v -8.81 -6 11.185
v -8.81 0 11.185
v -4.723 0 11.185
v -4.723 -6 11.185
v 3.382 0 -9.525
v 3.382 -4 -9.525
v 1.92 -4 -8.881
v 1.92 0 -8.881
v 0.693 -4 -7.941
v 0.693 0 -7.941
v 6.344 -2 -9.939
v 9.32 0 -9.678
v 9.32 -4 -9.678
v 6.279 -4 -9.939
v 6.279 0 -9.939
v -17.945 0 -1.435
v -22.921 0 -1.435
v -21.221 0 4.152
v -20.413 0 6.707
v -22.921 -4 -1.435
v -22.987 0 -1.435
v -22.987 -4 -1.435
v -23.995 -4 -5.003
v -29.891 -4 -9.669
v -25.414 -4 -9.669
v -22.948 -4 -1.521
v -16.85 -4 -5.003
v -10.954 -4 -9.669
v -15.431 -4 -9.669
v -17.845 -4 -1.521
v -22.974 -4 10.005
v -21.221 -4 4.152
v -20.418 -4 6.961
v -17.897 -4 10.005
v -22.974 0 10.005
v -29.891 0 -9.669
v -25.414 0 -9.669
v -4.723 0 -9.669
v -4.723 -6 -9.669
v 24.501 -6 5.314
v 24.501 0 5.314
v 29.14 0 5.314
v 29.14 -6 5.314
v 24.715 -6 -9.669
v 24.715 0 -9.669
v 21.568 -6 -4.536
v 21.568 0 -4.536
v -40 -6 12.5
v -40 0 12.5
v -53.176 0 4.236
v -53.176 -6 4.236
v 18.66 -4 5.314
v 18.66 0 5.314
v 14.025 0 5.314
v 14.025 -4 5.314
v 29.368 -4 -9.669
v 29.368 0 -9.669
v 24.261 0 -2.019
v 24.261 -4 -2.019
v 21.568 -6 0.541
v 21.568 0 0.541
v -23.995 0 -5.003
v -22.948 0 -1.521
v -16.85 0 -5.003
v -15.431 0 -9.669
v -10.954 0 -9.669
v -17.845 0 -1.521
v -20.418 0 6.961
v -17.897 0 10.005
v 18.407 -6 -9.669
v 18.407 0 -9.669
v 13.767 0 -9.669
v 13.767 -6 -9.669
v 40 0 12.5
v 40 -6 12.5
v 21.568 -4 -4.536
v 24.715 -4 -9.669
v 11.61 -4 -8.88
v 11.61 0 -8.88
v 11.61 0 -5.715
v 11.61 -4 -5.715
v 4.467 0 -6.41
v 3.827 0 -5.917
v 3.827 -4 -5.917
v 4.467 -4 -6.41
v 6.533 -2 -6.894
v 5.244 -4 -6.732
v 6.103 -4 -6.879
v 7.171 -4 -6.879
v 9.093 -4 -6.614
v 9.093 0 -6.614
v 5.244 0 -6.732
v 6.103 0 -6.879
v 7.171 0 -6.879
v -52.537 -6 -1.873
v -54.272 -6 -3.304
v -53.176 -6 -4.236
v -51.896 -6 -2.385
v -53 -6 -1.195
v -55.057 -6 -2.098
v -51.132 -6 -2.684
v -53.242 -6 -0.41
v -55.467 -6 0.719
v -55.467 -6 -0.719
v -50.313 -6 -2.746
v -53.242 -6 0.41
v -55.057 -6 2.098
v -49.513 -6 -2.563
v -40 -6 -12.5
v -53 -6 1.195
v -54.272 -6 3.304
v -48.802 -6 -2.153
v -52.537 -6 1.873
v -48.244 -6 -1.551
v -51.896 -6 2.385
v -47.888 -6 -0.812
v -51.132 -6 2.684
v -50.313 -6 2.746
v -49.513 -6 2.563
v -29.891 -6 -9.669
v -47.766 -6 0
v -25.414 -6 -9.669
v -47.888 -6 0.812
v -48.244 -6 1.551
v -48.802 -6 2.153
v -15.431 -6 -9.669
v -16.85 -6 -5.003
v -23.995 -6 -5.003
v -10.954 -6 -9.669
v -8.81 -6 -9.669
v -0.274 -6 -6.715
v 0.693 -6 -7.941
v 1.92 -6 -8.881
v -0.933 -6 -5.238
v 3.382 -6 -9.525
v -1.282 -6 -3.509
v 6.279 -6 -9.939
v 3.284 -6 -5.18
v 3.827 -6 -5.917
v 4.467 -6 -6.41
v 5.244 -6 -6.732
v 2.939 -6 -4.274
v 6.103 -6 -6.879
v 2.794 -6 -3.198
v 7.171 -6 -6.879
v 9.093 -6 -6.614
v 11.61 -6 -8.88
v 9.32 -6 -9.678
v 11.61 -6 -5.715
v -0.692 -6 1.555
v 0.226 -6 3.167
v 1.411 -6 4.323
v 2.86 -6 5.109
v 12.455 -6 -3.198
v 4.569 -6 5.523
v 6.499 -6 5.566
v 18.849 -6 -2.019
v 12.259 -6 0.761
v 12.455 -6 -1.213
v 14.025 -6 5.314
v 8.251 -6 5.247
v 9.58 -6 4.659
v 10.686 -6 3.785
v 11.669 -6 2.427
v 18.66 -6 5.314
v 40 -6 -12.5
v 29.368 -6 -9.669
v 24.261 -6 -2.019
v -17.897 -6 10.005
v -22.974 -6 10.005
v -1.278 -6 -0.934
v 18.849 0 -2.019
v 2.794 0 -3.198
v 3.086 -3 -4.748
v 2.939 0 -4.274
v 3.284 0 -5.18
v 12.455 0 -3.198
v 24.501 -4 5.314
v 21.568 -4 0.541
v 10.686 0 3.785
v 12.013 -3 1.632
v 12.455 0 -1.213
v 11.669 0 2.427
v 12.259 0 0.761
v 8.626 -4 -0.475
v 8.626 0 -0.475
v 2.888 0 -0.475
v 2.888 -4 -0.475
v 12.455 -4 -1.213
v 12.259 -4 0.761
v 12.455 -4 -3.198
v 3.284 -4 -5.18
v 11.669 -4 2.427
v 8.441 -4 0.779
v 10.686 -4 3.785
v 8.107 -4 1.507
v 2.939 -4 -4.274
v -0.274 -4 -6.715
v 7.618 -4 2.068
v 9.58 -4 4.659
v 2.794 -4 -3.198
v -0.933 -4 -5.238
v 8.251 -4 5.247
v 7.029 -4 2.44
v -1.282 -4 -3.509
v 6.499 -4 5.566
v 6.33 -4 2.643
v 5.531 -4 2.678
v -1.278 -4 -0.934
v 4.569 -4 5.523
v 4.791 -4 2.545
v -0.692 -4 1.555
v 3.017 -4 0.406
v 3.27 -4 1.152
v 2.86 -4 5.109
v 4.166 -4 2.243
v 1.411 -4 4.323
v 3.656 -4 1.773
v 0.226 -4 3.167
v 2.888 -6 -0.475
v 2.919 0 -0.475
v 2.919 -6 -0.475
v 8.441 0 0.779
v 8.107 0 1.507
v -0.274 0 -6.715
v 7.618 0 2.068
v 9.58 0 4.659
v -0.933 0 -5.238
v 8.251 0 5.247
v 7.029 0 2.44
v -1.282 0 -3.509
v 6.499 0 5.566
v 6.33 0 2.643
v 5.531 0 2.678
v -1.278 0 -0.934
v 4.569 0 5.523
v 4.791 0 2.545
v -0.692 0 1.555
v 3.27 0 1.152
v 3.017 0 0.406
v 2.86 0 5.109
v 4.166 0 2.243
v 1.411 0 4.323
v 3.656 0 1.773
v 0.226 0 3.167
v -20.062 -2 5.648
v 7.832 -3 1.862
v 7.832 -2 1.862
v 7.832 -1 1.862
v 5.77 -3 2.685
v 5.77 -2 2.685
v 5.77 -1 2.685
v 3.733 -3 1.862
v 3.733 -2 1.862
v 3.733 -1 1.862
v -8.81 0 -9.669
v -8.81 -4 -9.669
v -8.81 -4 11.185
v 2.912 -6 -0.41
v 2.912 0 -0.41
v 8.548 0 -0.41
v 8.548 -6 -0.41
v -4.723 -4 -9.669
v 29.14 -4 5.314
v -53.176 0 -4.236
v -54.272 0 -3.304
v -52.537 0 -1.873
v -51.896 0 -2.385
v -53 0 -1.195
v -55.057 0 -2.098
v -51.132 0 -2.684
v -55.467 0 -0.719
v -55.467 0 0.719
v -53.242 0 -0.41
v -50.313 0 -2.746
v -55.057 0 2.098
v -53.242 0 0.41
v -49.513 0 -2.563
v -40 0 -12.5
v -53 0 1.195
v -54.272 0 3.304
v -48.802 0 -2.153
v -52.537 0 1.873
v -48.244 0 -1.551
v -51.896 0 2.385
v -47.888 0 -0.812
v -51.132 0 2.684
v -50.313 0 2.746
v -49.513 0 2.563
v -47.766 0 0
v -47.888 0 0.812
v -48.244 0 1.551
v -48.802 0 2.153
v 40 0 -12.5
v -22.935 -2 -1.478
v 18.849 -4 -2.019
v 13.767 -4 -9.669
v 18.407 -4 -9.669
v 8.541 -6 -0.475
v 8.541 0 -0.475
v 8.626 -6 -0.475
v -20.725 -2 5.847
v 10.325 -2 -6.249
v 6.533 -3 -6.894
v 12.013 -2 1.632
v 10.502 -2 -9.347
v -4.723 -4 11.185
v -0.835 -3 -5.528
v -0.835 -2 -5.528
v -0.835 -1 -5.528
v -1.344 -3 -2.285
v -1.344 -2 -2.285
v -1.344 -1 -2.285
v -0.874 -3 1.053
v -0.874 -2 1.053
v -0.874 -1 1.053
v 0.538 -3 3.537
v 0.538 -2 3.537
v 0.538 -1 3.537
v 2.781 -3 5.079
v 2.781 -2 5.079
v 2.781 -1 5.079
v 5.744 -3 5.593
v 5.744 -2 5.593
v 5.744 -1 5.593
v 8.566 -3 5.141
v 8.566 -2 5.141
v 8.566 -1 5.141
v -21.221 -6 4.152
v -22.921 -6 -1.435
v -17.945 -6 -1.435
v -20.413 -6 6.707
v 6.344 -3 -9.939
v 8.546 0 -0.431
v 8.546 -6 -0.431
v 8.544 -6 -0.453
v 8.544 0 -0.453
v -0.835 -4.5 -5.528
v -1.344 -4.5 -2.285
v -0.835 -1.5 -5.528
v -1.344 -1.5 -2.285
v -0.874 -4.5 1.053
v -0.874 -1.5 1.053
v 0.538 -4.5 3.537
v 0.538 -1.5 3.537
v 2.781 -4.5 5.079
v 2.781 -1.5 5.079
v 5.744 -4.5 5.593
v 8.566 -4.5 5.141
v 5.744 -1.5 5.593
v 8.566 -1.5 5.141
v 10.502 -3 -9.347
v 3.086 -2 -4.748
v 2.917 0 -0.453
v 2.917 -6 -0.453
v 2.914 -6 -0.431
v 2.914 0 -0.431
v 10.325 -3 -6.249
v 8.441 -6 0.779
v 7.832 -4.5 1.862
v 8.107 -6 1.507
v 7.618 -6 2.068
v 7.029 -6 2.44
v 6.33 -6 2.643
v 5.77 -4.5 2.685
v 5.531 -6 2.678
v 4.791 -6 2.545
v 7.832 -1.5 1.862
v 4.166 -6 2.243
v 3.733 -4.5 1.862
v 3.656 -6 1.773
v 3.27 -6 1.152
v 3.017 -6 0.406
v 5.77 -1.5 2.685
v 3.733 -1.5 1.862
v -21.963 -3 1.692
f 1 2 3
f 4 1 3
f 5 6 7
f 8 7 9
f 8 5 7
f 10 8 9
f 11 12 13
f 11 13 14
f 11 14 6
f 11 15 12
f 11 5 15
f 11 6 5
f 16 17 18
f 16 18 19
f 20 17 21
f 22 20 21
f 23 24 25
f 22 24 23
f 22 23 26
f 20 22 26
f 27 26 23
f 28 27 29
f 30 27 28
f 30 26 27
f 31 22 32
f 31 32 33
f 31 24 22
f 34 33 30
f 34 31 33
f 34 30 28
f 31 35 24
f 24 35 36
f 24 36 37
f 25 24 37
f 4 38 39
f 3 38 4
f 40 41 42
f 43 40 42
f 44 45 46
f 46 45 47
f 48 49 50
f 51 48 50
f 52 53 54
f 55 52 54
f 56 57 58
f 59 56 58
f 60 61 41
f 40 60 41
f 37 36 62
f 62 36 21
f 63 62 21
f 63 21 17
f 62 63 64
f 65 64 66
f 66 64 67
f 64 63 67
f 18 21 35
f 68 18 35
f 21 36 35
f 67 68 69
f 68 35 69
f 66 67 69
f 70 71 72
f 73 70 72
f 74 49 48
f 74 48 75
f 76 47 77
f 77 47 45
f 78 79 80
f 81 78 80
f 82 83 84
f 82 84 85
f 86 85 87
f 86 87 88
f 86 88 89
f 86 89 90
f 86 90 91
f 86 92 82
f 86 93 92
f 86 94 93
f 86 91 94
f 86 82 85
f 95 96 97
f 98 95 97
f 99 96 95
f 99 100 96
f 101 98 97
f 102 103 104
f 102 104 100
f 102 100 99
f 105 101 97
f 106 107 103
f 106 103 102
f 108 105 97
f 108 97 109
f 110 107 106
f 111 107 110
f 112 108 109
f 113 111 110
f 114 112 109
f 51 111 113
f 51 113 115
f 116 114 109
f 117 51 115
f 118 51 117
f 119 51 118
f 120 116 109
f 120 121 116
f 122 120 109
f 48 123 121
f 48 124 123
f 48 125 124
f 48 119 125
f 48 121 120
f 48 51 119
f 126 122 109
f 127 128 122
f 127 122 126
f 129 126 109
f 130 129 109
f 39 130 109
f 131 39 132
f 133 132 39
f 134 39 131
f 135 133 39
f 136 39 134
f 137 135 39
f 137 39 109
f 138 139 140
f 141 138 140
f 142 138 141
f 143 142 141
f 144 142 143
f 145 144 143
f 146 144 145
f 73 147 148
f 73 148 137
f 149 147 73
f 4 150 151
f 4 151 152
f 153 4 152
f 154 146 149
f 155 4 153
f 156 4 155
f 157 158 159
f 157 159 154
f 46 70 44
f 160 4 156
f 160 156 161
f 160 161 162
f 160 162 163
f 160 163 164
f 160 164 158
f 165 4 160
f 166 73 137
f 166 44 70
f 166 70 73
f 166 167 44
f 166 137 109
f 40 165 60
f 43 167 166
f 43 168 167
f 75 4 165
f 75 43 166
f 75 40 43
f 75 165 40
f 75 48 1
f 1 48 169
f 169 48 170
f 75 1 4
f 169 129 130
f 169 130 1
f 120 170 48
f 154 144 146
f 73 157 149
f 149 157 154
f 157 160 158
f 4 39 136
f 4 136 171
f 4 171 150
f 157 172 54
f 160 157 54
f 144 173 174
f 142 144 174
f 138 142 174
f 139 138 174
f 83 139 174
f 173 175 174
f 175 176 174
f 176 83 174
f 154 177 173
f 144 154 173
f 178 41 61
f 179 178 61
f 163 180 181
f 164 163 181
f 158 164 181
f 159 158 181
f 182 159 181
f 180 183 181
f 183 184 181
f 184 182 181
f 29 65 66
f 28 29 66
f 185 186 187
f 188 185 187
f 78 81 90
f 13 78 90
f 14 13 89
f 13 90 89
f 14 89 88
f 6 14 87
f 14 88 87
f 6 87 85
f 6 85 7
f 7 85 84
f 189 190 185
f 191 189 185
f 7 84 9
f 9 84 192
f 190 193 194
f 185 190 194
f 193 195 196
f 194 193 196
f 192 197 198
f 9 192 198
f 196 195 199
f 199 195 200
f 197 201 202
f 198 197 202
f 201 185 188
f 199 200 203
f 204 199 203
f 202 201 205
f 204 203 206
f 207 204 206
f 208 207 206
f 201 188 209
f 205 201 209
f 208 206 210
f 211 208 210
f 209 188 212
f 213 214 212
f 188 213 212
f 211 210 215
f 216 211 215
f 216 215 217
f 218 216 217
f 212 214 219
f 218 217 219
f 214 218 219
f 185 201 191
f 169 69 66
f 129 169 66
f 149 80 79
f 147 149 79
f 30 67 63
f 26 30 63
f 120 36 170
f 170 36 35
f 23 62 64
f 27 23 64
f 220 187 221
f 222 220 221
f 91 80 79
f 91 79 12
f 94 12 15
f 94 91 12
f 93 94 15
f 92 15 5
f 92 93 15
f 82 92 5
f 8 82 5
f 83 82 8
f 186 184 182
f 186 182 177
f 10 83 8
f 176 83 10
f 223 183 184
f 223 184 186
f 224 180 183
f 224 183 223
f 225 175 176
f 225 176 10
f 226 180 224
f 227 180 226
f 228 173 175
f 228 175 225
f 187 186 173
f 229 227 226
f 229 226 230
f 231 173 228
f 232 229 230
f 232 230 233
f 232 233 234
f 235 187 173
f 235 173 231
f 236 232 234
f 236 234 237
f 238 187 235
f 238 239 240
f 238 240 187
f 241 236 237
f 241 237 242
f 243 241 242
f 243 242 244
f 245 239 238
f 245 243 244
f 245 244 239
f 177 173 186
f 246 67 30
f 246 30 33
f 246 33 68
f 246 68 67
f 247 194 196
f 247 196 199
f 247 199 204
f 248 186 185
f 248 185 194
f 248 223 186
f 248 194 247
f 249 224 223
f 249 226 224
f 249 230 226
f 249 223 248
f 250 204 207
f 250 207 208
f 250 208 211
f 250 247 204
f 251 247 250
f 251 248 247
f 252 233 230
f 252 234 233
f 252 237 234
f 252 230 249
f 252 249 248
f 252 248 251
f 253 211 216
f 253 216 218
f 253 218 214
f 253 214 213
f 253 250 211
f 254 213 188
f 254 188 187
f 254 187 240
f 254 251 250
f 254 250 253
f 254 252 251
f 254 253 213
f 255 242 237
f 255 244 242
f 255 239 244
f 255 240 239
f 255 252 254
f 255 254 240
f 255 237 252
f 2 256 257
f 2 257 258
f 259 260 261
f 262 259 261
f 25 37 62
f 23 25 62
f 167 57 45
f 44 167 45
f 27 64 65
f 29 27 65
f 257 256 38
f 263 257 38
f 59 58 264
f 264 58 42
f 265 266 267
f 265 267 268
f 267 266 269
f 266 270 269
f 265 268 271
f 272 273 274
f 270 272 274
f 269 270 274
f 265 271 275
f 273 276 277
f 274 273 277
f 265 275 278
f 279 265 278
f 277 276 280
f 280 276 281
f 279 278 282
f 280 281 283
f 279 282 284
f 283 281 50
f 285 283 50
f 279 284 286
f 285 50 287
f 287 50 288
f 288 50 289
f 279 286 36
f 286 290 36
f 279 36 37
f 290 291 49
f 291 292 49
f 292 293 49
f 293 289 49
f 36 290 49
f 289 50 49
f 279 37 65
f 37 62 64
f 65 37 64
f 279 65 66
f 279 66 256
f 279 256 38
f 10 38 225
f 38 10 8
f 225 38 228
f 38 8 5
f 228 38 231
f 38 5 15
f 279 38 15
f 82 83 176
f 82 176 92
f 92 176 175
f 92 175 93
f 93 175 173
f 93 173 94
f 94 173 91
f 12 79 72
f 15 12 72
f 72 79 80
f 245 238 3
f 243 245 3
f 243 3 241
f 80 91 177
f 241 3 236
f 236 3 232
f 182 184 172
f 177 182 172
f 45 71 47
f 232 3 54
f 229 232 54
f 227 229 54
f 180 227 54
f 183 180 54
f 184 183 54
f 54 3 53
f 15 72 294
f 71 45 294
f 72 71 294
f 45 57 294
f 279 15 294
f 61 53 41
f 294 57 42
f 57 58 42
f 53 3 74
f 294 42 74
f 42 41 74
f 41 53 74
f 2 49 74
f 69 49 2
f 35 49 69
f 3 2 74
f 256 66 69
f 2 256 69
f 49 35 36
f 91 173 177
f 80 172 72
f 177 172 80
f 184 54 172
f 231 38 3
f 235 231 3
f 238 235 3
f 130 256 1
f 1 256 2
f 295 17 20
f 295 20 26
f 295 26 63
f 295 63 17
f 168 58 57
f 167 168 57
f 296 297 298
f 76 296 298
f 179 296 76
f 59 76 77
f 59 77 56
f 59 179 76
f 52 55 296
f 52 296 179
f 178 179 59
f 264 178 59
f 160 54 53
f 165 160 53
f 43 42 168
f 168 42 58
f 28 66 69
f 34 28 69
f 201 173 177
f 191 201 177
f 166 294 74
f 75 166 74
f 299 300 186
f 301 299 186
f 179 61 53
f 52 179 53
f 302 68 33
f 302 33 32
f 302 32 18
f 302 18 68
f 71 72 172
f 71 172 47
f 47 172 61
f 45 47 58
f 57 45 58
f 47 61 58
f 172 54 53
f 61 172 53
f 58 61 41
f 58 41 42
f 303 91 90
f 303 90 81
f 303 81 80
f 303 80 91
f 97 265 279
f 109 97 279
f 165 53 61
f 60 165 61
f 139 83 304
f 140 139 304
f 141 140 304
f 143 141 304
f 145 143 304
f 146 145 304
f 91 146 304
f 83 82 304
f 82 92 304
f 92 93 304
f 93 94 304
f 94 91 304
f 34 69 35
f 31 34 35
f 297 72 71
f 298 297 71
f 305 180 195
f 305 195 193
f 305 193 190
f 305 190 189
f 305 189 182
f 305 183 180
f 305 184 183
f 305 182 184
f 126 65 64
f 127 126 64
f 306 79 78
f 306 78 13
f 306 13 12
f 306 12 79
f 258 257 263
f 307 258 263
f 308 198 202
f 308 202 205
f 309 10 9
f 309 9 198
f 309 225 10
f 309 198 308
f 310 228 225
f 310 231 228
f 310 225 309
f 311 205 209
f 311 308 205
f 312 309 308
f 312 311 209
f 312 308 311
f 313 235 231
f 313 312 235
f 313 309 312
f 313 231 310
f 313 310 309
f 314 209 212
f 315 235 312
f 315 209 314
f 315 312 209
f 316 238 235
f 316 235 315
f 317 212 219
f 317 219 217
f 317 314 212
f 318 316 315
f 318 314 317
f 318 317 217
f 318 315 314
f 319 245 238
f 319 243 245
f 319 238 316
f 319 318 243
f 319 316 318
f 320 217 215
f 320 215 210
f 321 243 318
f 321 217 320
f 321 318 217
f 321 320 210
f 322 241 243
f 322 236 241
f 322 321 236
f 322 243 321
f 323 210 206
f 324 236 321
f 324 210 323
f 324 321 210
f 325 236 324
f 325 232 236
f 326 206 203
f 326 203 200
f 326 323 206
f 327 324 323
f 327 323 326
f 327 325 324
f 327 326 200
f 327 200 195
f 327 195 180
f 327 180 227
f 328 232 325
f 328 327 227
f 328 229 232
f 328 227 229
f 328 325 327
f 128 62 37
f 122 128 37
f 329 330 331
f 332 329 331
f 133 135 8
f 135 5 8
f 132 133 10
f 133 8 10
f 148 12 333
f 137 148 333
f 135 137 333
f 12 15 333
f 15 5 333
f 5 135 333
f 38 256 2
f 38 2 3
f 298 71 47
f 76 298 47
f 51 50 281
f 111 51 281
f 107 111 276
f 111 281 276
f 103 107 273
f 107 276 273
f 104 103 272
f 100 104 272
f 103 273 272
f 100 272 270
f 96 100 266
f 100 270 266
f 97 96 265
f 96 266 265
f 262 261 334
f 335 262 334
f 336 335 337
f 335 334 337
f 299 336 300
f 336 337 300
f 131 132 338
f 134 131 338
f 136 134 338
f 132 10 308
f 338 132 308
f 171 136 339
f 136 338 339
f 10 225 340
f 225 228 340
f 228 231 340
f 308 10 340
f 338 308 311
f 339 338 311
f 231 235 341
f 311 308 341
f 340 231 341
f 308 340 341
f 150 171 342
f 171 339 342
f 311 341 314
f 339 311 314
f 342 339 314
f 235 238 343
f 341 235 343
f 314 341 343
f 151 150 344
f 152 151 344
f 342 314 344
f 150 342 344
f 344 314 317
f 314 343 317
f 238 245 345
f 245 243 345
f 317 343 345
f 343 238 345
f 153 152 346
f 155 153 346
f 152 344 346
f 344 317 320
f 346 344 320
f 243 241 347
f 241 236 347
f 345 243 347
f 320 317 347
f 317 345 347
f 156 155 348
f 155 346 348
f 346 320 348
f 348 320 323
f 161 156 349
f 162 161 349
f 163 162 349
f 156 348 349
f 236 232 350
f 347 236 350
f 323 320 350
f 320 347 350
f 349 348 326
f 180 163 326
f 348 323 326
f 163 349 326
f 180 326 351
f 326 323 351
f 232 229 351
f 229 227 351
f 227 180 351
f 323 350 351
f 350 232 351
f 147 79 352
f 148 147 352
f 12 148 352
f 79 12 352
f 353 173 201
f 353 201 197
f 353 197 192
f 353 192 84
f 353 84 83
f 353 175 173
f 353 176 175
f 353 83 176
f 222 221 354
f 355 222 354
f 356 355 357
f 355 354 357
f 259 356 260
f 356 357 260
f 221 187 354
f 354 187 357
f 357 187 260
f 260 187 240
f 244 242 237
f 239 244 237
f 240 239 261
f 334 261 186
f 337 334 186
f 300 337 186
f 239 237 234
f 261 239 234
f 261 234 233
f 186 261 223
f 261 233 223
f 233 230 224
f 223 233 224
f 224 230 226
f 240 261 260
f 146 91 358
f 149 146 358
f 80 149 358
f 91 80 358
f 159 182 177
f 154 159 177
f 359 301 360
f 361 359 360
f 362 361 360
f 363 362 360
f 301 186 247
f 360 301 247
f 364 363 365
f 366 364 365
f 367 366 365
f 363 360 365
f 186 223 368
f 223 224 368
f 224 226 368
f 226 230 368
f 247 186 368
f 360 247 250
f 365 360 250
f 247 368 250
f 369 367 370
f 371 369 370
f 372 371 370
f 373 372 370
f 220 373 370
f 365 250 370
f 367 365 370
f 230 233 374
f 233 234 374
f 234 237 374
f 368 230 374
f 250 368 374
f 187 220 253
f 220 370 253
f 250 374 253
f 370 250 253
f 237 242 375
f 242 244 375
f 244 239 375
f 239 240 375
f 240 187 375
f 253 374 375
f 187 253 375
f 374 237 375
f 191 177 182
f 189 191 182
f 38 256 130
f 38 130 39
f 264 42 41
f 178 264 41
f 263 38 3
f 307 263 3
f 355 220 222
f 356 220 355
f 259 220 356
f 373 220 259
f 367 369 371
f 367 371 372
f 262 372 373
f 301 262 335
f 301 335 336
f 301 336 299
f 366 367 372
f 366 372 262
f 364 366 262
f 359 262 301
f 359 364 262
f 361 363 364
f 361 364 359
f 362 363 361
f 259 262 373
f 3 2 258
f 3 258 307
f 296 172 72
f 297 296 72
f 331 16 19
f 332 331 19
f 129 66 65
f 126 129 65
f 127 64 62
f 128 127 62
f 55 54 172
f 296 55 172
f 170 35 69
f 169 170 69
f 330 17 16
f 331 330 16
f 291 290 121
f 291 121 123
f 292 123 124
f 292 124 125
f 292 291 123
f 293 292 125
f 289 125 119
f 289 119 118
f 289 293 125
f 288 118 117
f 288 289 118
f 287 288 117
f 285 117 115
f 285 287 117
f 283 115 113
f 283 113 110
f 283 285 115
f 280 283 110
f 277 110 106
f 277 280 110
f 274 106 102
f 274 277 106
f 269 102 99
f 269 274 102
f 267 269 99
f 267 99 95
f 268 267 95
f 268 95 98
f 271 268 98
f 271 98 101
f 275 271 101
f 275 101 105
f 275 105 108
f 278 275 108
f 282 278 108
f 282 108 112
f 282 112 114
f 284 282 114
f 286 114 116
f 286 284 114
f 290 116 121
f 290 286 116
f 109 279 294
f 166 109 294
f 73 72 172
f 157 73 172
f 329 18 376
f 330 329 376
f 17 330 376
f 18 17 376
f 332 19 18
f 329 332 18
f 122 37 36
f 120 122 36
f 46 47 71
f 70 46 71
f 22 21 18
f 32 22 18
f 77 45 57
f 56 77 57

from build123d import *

# Parameters (mm, degrees)
F0_W     = 4.0866517243
F0_H     = 20.8535019259
F1_DEPTH = 4
F0_W_2   = 80
F0_H_2   = 25
F0_R     = 2.753388348
F2_DEPTH = 6


with BuildPart() as f1:
    # F0 (on Front) → F1 (new body)
    with BuildSketch(Plane.XZ):
        Polygon((-16.8504189482, -5.0033860866), (-15.431025747, -9.6689444035), (-10.9541480973, -9.6689444035), (-17.8967390119, 10.0053033521), (-22.9739642392, 10.0053033521), (-29.890825972, -9.6689444035), (-25.4139483222, -9.6689444035), (-23.994555121, -5.0033860866), align=None)
        with BuildLine():
            Line((-22.9214353789, -1.4345208183), (-22.9871142656, -1.4345208183))
            Line((-22.9871142656, -1.4345208183), (-21.2211364833, 4.1517354839))
            add(Edge.make_bspline(
                [(-20.4181988376, 6.9606834946), (-20.6301227734, 6.137677919), (-21.2211364833, 4.1517354839)],
                knots=[0, 0, 0, 0.4798086346, 0.4798086346, 0.4798086346], degree=2))
            add(Edge.make_bspline(
                [(-20.0622784881, 5.6484952179), (-20.3109939131, 6.4804054325), (-20.4181988376, 6.9606834946)],
                knots=[0, 0, 0, 1, 1, 1], degree=2))
            add(Edge.make_bspline(
                [(-17.8452806481, -1.5213701368), (-19.8135630631, 4.8165850033), (-20.0622784881, 5.6484952179)],
                knots=[0, 0, 0, 1, 1, 1], degree=2))
            Line((-17.8452806481, -1.5213701368), (-22.9482350573, -1.5213701368))
            add(Edge.make_bspline(
                [(-22.9214353789, -1.4345208183), (-22.934801148, -1.4778409604), (-22.9482350573, -1.5213701368)],
                knots=[0.9935672196, 0.9935672196, 0.9935672196, 1, 1, 1], degree=2))
        make_face(mode=Mode.SUBTRACT)
        with Locations((-6.7667237439, 0.7578065594)):
            Rectangle(F0_W, F0_H)
        with BuildLine():
            add(Edge.make_bspline(
                [(6.3444385301, -9.9391008134), (2.7294884739, -9.9391008134), (0.6925949072, -7.9408010196)],
                knots=[0, 0, 0, 1, 1, 1], degree=2))
            add(Edge.make_bspline(
                [(9.320447236, -9.6775207975), (8.1025992929, -9.9391008134), (6.3444385301, -9.9391008134)],
                knots=[0, 0, 0, 1, 1, 1], degree=2))
            add(Edge.make_bspline(
                [(11.6103444246, -8.8799161588), (10.538295179, -9.4159407816), (9.320447236, -9.6775207975)],
                knots=[0, 0, 0, 1, 1, 1], degree=2))
            Line((11.6103444246, -8.8799161588), (11.6103444246, -5.7152267857))
            add(Edge.make_bspline(
                [(9.0931727959, -6.6136040535), (10.298156148, -6.3327271512), (11.6103444246, -5.7152267857)],
                knots=[0, 0, 0, 1, 1, 1], degree=2))
            add(Edge.make_bspline(
                [(6.5331191973, -6.8944809559), (7.8881894438, -6.8944809559), (9.0931727959, -6.6136040535)],
                knots=[0, 0, 0, 1, 1, 1], degree=2))
            add(Edge.make_bspline(
                [(3.8272669014, -5.9167720438), (4.7921112224, -6.8944809559), (6.5331191973, -6.8944809559)],
                knots=[0, 0, 0, 1, 1, 1], degree=2))
            add(Edge.make_bspline(
                [(2.7938114286, -3.1980551569), (2.8624225803, -4.9390631318), (3.8272669014, -5.9167720438)],
                knots=[0, 0, 0, 1, 1, 1], degree=2))
            Line((2.7938114286, -3.1980551569), (12.4551192302, -3.1980551569))
            Line((12.4551192302, -3.1980551569), (12.4551192302, -1.2126199541))
            add(Edge.make_bspline(
                [(10.6862379749, 3.785273629), (12.4551192302, 1.9777986009), (12.4551192302, -1.2126199541)],
                knots=[0, 0, 0, 1, 1, 1], degree=2))
            add(Edge.make_bspline(
                [(5.7440909526, 5.5927486572), (8.9173567196, 5.5927486572), (10.6862379749, 3.785273629)],
                knots=[0, 0, 0, 1, 1, 1], degree=2))
            add(Edge.make_bspline(
                [(0.5382198158, 3.5365582041), (2.4207382911, 5.5927486572), (5.7440909526, 5.5927486572)],
                knots=[0, 0, 0, 1, 1, 1], degree=2))
            add(Edge.make_bspline(
                [(-1.3442986595, -2.2846691997), (-1.3442986595, 1.480367751), (0.5382198158, 3.5365582041)],
                knots=[0, 0, 0, 1, 1, 1], degree=2))
            add(Edge.make_bspline(
                [(0.6925949072, -7.9408010196), (-1.3442986595, -5.9425012257), (-1.3442986595, -2.2846691997)],
                knots=[0, 0, 0, 1, 1, 1], degree=2))
        make_face()
        with BuildLine():
            ThreePointArc((8.5413720325, -0.4750500731), (5.7301505938, -2.9905176858), (2.9189291551, -0.4750500731))
            Line((2.9189291551, -0.4750500731), (2.8881517622, -0.4750500731))
            add(Edge.make_bspline(
                [(3.7329265678, 1.8620172824), (2.9953566868, 1.0386834618), (2.8881517622, -0.4750500731)],
                knots=[0, 0, 0, 1, 1, 1], degree=2))
            add(Edge.make_bspline(
                [(5.7698201344, 2.685351103), (4.4704964488, 2.685351103), (3.7329265678, 1.8620172824)],
                knots=[0, 0, 0, 1, 1, 1], degree=2))
            add(Edge.make_bspline(
                [(7.832442883, 1.8620172824), (7.0691438201, 2.685351103), (5.7698201344, 2.685351103)],
                knots=[0, 0, 0, 1, 1, 1], degree=2))
            add(Edge.make_bspline(
                [(8.6257593248, -0.4750500731), (8.5957419459, 1.0386834618), (7.832442883, 1.8620172824)],
                knots=[0, 0, 0, 1, 1, 1], degree=2))
            Line((8.6257593248, -0.4750500731), (8.5413720325, -0.4750500731))
        make_face(mode=Mode.SUBTRACT)
        Polygon((14.0245993257, 5.3140158533), (18.848820931, -2.0188009868), (13.7673075068, -9.6689444035), (18.4071366419, -9.6689444035), (21.5675378179, -4.5359726155), (24.7150744031, -9.6689444035), (29.3677681291, -9.6689444035), (24.260525523, -2.0188009868), (29.140493689, 5.3140158533), (24.500664554, 5.3140158533), (21.5675378179, 0.5412526118), (18.6601402638, 5.3140158533), align=None)
        with BuildLine():
            Line((8.5413720325, -0.4750500731), (2.9189291551, -0.4750500731))
            ThreePointArc((2.9189291551, -0.4750500731), (5.7301505938, -2.9905176858), (8.5413720325, -0.4750500731))
        make_face()
    extrude(amount=F1_DEPTH)


with BuildPart() as f2:
    # F0 (on Front) → F2 (new body)
    with BuildSketch(Plane.XZ):
        Rectangle(F0_W_2, F0_H_2)
        with BuildLine():
            add(Edge.make_bspline(
                [(9.320447236, -9.6775207975), (8.1025992929, -9.9391008134), (6.3444385301, -9.9391008134)],
                knots=[0, 0, 0, 1, 1, 1], degree=2))
            add(Edge.make_bspline(
                [(6.3444385301, -9.9391008134), (2.7294884739, -9.9391008134), (0.6925949072, -7.9408010196)],
                knots=[0, 0, 0, 1, 1, 1], degree=2))
            add(Edge.make_bspline(
                [(0.6925949072, -7.9408010196), (-1.3442986595, -5.9425012257), (-1.3442986595, -2.2846691997)],
                knots=[0, 0, 0, 1, 1, 1], degree=2))
            add(Edge.make_bspline(
                [(-1.3442986595, -2.2846691997), (-1.3442986595, 1.480367751), (0.5382198158, 3.5365582041)],
                knots=[0, 0, 0, 1, 1, 1], degree=2))
            add(Edge.make_bspline(
                [(0.5382198158, 3.5365582041), (2.4207382911, 5.5927486572), (5.7440909526, 5.5927486572)],
                knots=[0, 0, 0, 1, 1, 1], degree=2))
            add(Edge.make_bspline(
                [(5.7440909526, 5.5927486572), (8.9173567196, 5.5927486572), (10.6862379749, 3.785273629)],
                knots=[0, 0, 0, 1, 1, 1], degree=2))
            add(Edge.make_bspline(
                [(10.6862379749, 3.785273629), (12.4551192302, 1.9777986009), (12.4551192302, -1.2126199541)],
                knots=[0, 0, 0, 1, 1, 1], degree=2))
            Line((12.4551192302, -1.2126199541), (12.4551192302, -3.1980551569))
            Line((12.4551192302, -3.1980551569), (2.7938114286, -3.1980551569))
            add(Edge.make_bspline(
                [(2.7938114286, -3.1980551569), (2.8624225803, -4.9390631318), (3.8272669014, -5.9167720438)],
                knots=[0, 0, 0, 1, 1, 1], degree=2))
            add(Edge.make_bspline(
                [(3.8272669014, -5.9167720438), (4.7921112224, -6.8944809559), (6.5331191973, -6.8944809559)],
                knots=[0, 0, 0, 1, 1, 1], degree=2))
            add(Edge.make_bspline(
                [(6.5331191973, -6.8944809559), (7.8881894438, -6.8944809559), (9.0931727959, -6.6136040535)],
                knots=[0, 0, 0, 1, 1, 1], degree=2))
            add(Edge.make_bspline(
                [(9.0931727959, -6.6136040535), (10.298156148, -6.3327271512), (11.6103444246, -5.7152267857)],
                knots=[0, 0, 0, 1, 1, 1], degree=2))
            Line((11.6103444246, -5.7152267857), (11.6103444246, -8.8799161588))
            add(Edge.make_bspline(
                [(11.6103444246, -8.8799161588), (10.538295179, -9.4159407816), (9.320447236, -9.6775207975)],
                knots=[0, 0, 0, 1, 1, 1], degree=2))
        make_face(mode=Mode.SUBTRACT)
        Polygon((13.7673075068, -9.6689444035), (18.848820931, -2.0188009868), (14.0245993257, 5.3140158533), (18.6601402638, 5.3140158533), (21.5675378179, 0.5412526118), (24.500664554, 5.3140158533), (29.140493689, 5.3140158533), (24.260525523, -2.0188009868), (29.3677681291, -9.6689444035), (24.7150744031, -9.6689444035), (21.5675378179, -4.5359726155), (18.4071366419, -9.6689444035), align=None, mode=Mode.SUBTRACT)
        Polygon((-10.9541480973, -9.6689444035), (-15.431025747, -9.6689444035), (-16.8504189482, -5.0033860866), (-23.994555121, -5.0033860866), (-25.4139483222, -9.6689444035), (-29.890825972, -9.6689444035), (-22.9739642392, 10.0053033521), (-17.8967390119, 10.0053033521), align=None, mode=Mode.SUBTRACT)
        with Locations((-6.7667237439, 0.7578065594)):
            Rectangle(F0_W, F0_H, mode=Mode.SUBTRACT)
        with BuildLine():
            Line((-53.1757467349, -4.2357348042), (-40, -12.5))
            Line((-40, -12.5), (-40, 12.5))
            Line((-40, 12.5), (-53.1757467349, 4.2357348042))
            ThreePointArc((-53.1757467349, 4.2357348042), (-55.5189534294, 0), (-53.1757467349, -4.2357348042))
        make_face()
        with Locations((-50.5189534294, 0)):
            Circle(F0_R, mode=Mode.SUBTRACT)
    extrude(amount=F2_DEPTH)


with BuildPart() as f2b:
    # F0 (on Front) → F2, piece 2 (new body)
    with BuildSketch(Plane.XZ):
        with BuildLine():
            Line((-20.4134713858, 6.7065944895), (-21.2211364833, 4.1517354839))
            add(Edge.make_bspline(
                [(-21.2211364833, 4.1517354839), (-21.8539687116, 2.0252731781), (-22.9214353789, -1.4345208183)],
                knots=[0.4798086346, 0.4798086346, 0.4798086346, 0.9935672196, 0.9935672196, 0.9935672196], degree=2))
            Line((-22.9214353789, -1.4345208183), (-17.9448761046, -1.4345208183))
            Line((-17.9448761046, -1.4345208183), (-20.4134713858, 6.7065944895))
        make_face()
    extrude(amount=F2_DEPTH)


with BuildPart() as f2c:
    # F0 (on Front) → F2, piece 3 (new body)
    with BuildSketch(Plane.XZ):
        with BuildLine():
            ThreePointArc((2.9189291551, -0.4750500731), (2.9154802819, -0.4423627308), (2.9124114662, -0.4096375196))
            Line((2.9124114662, -0.4096375196), (8.5478897213, -0.4096375196))
            ThreePointArc((8.5478897213, -0.4096375196), (8.5448209057, -0.4423627308), (8.5413720325, -0.4750500731))
            Line((8.5413720325, -0.4750500731), (8.6257593248, -0.4750500731))
            add(Edge.make_bspline(
                [(8.6257593248, -0.4750500731), (8.5957419459, 1.0386834618), (7.832442883, 1.8620172824)],
                knots=[0, 0, 0, 1, 1, 1], degree=2))
            add(Edge.make_bspline(
                [(7.832442883, 1.8620172824), (7.0691438201, 2.685351103), (5.7698201344, 2.685351103)],
                knots=[0, 0, 0, 1, 1, 1], degree=2))
            add(Edge.make_bspline(
                [(5.7698201344, 2.685351103), (4.4704964488, 2.685351103), (3.7329265678, 1.8620172824)],
                knots=[0, 0, 0, 1, 1, 1], degree=2))
            add(Edge.make_bspline(
                [(3.7329265678, 1.8620172824), (2.9953566868, 1.0386834618), (2.8881517622, -0.4750500731)],
                knots=[0, 0, 0, 1, 1, 1], degree=2))
            Line((2.8881517622, -0.4750500731), (2.9189291551, -0.4750500731))
        make_face()
    extrude(amount=F2_DEPTH)


solid = Compound([f1.part, f2.part, f2b.part, f2c.part])
